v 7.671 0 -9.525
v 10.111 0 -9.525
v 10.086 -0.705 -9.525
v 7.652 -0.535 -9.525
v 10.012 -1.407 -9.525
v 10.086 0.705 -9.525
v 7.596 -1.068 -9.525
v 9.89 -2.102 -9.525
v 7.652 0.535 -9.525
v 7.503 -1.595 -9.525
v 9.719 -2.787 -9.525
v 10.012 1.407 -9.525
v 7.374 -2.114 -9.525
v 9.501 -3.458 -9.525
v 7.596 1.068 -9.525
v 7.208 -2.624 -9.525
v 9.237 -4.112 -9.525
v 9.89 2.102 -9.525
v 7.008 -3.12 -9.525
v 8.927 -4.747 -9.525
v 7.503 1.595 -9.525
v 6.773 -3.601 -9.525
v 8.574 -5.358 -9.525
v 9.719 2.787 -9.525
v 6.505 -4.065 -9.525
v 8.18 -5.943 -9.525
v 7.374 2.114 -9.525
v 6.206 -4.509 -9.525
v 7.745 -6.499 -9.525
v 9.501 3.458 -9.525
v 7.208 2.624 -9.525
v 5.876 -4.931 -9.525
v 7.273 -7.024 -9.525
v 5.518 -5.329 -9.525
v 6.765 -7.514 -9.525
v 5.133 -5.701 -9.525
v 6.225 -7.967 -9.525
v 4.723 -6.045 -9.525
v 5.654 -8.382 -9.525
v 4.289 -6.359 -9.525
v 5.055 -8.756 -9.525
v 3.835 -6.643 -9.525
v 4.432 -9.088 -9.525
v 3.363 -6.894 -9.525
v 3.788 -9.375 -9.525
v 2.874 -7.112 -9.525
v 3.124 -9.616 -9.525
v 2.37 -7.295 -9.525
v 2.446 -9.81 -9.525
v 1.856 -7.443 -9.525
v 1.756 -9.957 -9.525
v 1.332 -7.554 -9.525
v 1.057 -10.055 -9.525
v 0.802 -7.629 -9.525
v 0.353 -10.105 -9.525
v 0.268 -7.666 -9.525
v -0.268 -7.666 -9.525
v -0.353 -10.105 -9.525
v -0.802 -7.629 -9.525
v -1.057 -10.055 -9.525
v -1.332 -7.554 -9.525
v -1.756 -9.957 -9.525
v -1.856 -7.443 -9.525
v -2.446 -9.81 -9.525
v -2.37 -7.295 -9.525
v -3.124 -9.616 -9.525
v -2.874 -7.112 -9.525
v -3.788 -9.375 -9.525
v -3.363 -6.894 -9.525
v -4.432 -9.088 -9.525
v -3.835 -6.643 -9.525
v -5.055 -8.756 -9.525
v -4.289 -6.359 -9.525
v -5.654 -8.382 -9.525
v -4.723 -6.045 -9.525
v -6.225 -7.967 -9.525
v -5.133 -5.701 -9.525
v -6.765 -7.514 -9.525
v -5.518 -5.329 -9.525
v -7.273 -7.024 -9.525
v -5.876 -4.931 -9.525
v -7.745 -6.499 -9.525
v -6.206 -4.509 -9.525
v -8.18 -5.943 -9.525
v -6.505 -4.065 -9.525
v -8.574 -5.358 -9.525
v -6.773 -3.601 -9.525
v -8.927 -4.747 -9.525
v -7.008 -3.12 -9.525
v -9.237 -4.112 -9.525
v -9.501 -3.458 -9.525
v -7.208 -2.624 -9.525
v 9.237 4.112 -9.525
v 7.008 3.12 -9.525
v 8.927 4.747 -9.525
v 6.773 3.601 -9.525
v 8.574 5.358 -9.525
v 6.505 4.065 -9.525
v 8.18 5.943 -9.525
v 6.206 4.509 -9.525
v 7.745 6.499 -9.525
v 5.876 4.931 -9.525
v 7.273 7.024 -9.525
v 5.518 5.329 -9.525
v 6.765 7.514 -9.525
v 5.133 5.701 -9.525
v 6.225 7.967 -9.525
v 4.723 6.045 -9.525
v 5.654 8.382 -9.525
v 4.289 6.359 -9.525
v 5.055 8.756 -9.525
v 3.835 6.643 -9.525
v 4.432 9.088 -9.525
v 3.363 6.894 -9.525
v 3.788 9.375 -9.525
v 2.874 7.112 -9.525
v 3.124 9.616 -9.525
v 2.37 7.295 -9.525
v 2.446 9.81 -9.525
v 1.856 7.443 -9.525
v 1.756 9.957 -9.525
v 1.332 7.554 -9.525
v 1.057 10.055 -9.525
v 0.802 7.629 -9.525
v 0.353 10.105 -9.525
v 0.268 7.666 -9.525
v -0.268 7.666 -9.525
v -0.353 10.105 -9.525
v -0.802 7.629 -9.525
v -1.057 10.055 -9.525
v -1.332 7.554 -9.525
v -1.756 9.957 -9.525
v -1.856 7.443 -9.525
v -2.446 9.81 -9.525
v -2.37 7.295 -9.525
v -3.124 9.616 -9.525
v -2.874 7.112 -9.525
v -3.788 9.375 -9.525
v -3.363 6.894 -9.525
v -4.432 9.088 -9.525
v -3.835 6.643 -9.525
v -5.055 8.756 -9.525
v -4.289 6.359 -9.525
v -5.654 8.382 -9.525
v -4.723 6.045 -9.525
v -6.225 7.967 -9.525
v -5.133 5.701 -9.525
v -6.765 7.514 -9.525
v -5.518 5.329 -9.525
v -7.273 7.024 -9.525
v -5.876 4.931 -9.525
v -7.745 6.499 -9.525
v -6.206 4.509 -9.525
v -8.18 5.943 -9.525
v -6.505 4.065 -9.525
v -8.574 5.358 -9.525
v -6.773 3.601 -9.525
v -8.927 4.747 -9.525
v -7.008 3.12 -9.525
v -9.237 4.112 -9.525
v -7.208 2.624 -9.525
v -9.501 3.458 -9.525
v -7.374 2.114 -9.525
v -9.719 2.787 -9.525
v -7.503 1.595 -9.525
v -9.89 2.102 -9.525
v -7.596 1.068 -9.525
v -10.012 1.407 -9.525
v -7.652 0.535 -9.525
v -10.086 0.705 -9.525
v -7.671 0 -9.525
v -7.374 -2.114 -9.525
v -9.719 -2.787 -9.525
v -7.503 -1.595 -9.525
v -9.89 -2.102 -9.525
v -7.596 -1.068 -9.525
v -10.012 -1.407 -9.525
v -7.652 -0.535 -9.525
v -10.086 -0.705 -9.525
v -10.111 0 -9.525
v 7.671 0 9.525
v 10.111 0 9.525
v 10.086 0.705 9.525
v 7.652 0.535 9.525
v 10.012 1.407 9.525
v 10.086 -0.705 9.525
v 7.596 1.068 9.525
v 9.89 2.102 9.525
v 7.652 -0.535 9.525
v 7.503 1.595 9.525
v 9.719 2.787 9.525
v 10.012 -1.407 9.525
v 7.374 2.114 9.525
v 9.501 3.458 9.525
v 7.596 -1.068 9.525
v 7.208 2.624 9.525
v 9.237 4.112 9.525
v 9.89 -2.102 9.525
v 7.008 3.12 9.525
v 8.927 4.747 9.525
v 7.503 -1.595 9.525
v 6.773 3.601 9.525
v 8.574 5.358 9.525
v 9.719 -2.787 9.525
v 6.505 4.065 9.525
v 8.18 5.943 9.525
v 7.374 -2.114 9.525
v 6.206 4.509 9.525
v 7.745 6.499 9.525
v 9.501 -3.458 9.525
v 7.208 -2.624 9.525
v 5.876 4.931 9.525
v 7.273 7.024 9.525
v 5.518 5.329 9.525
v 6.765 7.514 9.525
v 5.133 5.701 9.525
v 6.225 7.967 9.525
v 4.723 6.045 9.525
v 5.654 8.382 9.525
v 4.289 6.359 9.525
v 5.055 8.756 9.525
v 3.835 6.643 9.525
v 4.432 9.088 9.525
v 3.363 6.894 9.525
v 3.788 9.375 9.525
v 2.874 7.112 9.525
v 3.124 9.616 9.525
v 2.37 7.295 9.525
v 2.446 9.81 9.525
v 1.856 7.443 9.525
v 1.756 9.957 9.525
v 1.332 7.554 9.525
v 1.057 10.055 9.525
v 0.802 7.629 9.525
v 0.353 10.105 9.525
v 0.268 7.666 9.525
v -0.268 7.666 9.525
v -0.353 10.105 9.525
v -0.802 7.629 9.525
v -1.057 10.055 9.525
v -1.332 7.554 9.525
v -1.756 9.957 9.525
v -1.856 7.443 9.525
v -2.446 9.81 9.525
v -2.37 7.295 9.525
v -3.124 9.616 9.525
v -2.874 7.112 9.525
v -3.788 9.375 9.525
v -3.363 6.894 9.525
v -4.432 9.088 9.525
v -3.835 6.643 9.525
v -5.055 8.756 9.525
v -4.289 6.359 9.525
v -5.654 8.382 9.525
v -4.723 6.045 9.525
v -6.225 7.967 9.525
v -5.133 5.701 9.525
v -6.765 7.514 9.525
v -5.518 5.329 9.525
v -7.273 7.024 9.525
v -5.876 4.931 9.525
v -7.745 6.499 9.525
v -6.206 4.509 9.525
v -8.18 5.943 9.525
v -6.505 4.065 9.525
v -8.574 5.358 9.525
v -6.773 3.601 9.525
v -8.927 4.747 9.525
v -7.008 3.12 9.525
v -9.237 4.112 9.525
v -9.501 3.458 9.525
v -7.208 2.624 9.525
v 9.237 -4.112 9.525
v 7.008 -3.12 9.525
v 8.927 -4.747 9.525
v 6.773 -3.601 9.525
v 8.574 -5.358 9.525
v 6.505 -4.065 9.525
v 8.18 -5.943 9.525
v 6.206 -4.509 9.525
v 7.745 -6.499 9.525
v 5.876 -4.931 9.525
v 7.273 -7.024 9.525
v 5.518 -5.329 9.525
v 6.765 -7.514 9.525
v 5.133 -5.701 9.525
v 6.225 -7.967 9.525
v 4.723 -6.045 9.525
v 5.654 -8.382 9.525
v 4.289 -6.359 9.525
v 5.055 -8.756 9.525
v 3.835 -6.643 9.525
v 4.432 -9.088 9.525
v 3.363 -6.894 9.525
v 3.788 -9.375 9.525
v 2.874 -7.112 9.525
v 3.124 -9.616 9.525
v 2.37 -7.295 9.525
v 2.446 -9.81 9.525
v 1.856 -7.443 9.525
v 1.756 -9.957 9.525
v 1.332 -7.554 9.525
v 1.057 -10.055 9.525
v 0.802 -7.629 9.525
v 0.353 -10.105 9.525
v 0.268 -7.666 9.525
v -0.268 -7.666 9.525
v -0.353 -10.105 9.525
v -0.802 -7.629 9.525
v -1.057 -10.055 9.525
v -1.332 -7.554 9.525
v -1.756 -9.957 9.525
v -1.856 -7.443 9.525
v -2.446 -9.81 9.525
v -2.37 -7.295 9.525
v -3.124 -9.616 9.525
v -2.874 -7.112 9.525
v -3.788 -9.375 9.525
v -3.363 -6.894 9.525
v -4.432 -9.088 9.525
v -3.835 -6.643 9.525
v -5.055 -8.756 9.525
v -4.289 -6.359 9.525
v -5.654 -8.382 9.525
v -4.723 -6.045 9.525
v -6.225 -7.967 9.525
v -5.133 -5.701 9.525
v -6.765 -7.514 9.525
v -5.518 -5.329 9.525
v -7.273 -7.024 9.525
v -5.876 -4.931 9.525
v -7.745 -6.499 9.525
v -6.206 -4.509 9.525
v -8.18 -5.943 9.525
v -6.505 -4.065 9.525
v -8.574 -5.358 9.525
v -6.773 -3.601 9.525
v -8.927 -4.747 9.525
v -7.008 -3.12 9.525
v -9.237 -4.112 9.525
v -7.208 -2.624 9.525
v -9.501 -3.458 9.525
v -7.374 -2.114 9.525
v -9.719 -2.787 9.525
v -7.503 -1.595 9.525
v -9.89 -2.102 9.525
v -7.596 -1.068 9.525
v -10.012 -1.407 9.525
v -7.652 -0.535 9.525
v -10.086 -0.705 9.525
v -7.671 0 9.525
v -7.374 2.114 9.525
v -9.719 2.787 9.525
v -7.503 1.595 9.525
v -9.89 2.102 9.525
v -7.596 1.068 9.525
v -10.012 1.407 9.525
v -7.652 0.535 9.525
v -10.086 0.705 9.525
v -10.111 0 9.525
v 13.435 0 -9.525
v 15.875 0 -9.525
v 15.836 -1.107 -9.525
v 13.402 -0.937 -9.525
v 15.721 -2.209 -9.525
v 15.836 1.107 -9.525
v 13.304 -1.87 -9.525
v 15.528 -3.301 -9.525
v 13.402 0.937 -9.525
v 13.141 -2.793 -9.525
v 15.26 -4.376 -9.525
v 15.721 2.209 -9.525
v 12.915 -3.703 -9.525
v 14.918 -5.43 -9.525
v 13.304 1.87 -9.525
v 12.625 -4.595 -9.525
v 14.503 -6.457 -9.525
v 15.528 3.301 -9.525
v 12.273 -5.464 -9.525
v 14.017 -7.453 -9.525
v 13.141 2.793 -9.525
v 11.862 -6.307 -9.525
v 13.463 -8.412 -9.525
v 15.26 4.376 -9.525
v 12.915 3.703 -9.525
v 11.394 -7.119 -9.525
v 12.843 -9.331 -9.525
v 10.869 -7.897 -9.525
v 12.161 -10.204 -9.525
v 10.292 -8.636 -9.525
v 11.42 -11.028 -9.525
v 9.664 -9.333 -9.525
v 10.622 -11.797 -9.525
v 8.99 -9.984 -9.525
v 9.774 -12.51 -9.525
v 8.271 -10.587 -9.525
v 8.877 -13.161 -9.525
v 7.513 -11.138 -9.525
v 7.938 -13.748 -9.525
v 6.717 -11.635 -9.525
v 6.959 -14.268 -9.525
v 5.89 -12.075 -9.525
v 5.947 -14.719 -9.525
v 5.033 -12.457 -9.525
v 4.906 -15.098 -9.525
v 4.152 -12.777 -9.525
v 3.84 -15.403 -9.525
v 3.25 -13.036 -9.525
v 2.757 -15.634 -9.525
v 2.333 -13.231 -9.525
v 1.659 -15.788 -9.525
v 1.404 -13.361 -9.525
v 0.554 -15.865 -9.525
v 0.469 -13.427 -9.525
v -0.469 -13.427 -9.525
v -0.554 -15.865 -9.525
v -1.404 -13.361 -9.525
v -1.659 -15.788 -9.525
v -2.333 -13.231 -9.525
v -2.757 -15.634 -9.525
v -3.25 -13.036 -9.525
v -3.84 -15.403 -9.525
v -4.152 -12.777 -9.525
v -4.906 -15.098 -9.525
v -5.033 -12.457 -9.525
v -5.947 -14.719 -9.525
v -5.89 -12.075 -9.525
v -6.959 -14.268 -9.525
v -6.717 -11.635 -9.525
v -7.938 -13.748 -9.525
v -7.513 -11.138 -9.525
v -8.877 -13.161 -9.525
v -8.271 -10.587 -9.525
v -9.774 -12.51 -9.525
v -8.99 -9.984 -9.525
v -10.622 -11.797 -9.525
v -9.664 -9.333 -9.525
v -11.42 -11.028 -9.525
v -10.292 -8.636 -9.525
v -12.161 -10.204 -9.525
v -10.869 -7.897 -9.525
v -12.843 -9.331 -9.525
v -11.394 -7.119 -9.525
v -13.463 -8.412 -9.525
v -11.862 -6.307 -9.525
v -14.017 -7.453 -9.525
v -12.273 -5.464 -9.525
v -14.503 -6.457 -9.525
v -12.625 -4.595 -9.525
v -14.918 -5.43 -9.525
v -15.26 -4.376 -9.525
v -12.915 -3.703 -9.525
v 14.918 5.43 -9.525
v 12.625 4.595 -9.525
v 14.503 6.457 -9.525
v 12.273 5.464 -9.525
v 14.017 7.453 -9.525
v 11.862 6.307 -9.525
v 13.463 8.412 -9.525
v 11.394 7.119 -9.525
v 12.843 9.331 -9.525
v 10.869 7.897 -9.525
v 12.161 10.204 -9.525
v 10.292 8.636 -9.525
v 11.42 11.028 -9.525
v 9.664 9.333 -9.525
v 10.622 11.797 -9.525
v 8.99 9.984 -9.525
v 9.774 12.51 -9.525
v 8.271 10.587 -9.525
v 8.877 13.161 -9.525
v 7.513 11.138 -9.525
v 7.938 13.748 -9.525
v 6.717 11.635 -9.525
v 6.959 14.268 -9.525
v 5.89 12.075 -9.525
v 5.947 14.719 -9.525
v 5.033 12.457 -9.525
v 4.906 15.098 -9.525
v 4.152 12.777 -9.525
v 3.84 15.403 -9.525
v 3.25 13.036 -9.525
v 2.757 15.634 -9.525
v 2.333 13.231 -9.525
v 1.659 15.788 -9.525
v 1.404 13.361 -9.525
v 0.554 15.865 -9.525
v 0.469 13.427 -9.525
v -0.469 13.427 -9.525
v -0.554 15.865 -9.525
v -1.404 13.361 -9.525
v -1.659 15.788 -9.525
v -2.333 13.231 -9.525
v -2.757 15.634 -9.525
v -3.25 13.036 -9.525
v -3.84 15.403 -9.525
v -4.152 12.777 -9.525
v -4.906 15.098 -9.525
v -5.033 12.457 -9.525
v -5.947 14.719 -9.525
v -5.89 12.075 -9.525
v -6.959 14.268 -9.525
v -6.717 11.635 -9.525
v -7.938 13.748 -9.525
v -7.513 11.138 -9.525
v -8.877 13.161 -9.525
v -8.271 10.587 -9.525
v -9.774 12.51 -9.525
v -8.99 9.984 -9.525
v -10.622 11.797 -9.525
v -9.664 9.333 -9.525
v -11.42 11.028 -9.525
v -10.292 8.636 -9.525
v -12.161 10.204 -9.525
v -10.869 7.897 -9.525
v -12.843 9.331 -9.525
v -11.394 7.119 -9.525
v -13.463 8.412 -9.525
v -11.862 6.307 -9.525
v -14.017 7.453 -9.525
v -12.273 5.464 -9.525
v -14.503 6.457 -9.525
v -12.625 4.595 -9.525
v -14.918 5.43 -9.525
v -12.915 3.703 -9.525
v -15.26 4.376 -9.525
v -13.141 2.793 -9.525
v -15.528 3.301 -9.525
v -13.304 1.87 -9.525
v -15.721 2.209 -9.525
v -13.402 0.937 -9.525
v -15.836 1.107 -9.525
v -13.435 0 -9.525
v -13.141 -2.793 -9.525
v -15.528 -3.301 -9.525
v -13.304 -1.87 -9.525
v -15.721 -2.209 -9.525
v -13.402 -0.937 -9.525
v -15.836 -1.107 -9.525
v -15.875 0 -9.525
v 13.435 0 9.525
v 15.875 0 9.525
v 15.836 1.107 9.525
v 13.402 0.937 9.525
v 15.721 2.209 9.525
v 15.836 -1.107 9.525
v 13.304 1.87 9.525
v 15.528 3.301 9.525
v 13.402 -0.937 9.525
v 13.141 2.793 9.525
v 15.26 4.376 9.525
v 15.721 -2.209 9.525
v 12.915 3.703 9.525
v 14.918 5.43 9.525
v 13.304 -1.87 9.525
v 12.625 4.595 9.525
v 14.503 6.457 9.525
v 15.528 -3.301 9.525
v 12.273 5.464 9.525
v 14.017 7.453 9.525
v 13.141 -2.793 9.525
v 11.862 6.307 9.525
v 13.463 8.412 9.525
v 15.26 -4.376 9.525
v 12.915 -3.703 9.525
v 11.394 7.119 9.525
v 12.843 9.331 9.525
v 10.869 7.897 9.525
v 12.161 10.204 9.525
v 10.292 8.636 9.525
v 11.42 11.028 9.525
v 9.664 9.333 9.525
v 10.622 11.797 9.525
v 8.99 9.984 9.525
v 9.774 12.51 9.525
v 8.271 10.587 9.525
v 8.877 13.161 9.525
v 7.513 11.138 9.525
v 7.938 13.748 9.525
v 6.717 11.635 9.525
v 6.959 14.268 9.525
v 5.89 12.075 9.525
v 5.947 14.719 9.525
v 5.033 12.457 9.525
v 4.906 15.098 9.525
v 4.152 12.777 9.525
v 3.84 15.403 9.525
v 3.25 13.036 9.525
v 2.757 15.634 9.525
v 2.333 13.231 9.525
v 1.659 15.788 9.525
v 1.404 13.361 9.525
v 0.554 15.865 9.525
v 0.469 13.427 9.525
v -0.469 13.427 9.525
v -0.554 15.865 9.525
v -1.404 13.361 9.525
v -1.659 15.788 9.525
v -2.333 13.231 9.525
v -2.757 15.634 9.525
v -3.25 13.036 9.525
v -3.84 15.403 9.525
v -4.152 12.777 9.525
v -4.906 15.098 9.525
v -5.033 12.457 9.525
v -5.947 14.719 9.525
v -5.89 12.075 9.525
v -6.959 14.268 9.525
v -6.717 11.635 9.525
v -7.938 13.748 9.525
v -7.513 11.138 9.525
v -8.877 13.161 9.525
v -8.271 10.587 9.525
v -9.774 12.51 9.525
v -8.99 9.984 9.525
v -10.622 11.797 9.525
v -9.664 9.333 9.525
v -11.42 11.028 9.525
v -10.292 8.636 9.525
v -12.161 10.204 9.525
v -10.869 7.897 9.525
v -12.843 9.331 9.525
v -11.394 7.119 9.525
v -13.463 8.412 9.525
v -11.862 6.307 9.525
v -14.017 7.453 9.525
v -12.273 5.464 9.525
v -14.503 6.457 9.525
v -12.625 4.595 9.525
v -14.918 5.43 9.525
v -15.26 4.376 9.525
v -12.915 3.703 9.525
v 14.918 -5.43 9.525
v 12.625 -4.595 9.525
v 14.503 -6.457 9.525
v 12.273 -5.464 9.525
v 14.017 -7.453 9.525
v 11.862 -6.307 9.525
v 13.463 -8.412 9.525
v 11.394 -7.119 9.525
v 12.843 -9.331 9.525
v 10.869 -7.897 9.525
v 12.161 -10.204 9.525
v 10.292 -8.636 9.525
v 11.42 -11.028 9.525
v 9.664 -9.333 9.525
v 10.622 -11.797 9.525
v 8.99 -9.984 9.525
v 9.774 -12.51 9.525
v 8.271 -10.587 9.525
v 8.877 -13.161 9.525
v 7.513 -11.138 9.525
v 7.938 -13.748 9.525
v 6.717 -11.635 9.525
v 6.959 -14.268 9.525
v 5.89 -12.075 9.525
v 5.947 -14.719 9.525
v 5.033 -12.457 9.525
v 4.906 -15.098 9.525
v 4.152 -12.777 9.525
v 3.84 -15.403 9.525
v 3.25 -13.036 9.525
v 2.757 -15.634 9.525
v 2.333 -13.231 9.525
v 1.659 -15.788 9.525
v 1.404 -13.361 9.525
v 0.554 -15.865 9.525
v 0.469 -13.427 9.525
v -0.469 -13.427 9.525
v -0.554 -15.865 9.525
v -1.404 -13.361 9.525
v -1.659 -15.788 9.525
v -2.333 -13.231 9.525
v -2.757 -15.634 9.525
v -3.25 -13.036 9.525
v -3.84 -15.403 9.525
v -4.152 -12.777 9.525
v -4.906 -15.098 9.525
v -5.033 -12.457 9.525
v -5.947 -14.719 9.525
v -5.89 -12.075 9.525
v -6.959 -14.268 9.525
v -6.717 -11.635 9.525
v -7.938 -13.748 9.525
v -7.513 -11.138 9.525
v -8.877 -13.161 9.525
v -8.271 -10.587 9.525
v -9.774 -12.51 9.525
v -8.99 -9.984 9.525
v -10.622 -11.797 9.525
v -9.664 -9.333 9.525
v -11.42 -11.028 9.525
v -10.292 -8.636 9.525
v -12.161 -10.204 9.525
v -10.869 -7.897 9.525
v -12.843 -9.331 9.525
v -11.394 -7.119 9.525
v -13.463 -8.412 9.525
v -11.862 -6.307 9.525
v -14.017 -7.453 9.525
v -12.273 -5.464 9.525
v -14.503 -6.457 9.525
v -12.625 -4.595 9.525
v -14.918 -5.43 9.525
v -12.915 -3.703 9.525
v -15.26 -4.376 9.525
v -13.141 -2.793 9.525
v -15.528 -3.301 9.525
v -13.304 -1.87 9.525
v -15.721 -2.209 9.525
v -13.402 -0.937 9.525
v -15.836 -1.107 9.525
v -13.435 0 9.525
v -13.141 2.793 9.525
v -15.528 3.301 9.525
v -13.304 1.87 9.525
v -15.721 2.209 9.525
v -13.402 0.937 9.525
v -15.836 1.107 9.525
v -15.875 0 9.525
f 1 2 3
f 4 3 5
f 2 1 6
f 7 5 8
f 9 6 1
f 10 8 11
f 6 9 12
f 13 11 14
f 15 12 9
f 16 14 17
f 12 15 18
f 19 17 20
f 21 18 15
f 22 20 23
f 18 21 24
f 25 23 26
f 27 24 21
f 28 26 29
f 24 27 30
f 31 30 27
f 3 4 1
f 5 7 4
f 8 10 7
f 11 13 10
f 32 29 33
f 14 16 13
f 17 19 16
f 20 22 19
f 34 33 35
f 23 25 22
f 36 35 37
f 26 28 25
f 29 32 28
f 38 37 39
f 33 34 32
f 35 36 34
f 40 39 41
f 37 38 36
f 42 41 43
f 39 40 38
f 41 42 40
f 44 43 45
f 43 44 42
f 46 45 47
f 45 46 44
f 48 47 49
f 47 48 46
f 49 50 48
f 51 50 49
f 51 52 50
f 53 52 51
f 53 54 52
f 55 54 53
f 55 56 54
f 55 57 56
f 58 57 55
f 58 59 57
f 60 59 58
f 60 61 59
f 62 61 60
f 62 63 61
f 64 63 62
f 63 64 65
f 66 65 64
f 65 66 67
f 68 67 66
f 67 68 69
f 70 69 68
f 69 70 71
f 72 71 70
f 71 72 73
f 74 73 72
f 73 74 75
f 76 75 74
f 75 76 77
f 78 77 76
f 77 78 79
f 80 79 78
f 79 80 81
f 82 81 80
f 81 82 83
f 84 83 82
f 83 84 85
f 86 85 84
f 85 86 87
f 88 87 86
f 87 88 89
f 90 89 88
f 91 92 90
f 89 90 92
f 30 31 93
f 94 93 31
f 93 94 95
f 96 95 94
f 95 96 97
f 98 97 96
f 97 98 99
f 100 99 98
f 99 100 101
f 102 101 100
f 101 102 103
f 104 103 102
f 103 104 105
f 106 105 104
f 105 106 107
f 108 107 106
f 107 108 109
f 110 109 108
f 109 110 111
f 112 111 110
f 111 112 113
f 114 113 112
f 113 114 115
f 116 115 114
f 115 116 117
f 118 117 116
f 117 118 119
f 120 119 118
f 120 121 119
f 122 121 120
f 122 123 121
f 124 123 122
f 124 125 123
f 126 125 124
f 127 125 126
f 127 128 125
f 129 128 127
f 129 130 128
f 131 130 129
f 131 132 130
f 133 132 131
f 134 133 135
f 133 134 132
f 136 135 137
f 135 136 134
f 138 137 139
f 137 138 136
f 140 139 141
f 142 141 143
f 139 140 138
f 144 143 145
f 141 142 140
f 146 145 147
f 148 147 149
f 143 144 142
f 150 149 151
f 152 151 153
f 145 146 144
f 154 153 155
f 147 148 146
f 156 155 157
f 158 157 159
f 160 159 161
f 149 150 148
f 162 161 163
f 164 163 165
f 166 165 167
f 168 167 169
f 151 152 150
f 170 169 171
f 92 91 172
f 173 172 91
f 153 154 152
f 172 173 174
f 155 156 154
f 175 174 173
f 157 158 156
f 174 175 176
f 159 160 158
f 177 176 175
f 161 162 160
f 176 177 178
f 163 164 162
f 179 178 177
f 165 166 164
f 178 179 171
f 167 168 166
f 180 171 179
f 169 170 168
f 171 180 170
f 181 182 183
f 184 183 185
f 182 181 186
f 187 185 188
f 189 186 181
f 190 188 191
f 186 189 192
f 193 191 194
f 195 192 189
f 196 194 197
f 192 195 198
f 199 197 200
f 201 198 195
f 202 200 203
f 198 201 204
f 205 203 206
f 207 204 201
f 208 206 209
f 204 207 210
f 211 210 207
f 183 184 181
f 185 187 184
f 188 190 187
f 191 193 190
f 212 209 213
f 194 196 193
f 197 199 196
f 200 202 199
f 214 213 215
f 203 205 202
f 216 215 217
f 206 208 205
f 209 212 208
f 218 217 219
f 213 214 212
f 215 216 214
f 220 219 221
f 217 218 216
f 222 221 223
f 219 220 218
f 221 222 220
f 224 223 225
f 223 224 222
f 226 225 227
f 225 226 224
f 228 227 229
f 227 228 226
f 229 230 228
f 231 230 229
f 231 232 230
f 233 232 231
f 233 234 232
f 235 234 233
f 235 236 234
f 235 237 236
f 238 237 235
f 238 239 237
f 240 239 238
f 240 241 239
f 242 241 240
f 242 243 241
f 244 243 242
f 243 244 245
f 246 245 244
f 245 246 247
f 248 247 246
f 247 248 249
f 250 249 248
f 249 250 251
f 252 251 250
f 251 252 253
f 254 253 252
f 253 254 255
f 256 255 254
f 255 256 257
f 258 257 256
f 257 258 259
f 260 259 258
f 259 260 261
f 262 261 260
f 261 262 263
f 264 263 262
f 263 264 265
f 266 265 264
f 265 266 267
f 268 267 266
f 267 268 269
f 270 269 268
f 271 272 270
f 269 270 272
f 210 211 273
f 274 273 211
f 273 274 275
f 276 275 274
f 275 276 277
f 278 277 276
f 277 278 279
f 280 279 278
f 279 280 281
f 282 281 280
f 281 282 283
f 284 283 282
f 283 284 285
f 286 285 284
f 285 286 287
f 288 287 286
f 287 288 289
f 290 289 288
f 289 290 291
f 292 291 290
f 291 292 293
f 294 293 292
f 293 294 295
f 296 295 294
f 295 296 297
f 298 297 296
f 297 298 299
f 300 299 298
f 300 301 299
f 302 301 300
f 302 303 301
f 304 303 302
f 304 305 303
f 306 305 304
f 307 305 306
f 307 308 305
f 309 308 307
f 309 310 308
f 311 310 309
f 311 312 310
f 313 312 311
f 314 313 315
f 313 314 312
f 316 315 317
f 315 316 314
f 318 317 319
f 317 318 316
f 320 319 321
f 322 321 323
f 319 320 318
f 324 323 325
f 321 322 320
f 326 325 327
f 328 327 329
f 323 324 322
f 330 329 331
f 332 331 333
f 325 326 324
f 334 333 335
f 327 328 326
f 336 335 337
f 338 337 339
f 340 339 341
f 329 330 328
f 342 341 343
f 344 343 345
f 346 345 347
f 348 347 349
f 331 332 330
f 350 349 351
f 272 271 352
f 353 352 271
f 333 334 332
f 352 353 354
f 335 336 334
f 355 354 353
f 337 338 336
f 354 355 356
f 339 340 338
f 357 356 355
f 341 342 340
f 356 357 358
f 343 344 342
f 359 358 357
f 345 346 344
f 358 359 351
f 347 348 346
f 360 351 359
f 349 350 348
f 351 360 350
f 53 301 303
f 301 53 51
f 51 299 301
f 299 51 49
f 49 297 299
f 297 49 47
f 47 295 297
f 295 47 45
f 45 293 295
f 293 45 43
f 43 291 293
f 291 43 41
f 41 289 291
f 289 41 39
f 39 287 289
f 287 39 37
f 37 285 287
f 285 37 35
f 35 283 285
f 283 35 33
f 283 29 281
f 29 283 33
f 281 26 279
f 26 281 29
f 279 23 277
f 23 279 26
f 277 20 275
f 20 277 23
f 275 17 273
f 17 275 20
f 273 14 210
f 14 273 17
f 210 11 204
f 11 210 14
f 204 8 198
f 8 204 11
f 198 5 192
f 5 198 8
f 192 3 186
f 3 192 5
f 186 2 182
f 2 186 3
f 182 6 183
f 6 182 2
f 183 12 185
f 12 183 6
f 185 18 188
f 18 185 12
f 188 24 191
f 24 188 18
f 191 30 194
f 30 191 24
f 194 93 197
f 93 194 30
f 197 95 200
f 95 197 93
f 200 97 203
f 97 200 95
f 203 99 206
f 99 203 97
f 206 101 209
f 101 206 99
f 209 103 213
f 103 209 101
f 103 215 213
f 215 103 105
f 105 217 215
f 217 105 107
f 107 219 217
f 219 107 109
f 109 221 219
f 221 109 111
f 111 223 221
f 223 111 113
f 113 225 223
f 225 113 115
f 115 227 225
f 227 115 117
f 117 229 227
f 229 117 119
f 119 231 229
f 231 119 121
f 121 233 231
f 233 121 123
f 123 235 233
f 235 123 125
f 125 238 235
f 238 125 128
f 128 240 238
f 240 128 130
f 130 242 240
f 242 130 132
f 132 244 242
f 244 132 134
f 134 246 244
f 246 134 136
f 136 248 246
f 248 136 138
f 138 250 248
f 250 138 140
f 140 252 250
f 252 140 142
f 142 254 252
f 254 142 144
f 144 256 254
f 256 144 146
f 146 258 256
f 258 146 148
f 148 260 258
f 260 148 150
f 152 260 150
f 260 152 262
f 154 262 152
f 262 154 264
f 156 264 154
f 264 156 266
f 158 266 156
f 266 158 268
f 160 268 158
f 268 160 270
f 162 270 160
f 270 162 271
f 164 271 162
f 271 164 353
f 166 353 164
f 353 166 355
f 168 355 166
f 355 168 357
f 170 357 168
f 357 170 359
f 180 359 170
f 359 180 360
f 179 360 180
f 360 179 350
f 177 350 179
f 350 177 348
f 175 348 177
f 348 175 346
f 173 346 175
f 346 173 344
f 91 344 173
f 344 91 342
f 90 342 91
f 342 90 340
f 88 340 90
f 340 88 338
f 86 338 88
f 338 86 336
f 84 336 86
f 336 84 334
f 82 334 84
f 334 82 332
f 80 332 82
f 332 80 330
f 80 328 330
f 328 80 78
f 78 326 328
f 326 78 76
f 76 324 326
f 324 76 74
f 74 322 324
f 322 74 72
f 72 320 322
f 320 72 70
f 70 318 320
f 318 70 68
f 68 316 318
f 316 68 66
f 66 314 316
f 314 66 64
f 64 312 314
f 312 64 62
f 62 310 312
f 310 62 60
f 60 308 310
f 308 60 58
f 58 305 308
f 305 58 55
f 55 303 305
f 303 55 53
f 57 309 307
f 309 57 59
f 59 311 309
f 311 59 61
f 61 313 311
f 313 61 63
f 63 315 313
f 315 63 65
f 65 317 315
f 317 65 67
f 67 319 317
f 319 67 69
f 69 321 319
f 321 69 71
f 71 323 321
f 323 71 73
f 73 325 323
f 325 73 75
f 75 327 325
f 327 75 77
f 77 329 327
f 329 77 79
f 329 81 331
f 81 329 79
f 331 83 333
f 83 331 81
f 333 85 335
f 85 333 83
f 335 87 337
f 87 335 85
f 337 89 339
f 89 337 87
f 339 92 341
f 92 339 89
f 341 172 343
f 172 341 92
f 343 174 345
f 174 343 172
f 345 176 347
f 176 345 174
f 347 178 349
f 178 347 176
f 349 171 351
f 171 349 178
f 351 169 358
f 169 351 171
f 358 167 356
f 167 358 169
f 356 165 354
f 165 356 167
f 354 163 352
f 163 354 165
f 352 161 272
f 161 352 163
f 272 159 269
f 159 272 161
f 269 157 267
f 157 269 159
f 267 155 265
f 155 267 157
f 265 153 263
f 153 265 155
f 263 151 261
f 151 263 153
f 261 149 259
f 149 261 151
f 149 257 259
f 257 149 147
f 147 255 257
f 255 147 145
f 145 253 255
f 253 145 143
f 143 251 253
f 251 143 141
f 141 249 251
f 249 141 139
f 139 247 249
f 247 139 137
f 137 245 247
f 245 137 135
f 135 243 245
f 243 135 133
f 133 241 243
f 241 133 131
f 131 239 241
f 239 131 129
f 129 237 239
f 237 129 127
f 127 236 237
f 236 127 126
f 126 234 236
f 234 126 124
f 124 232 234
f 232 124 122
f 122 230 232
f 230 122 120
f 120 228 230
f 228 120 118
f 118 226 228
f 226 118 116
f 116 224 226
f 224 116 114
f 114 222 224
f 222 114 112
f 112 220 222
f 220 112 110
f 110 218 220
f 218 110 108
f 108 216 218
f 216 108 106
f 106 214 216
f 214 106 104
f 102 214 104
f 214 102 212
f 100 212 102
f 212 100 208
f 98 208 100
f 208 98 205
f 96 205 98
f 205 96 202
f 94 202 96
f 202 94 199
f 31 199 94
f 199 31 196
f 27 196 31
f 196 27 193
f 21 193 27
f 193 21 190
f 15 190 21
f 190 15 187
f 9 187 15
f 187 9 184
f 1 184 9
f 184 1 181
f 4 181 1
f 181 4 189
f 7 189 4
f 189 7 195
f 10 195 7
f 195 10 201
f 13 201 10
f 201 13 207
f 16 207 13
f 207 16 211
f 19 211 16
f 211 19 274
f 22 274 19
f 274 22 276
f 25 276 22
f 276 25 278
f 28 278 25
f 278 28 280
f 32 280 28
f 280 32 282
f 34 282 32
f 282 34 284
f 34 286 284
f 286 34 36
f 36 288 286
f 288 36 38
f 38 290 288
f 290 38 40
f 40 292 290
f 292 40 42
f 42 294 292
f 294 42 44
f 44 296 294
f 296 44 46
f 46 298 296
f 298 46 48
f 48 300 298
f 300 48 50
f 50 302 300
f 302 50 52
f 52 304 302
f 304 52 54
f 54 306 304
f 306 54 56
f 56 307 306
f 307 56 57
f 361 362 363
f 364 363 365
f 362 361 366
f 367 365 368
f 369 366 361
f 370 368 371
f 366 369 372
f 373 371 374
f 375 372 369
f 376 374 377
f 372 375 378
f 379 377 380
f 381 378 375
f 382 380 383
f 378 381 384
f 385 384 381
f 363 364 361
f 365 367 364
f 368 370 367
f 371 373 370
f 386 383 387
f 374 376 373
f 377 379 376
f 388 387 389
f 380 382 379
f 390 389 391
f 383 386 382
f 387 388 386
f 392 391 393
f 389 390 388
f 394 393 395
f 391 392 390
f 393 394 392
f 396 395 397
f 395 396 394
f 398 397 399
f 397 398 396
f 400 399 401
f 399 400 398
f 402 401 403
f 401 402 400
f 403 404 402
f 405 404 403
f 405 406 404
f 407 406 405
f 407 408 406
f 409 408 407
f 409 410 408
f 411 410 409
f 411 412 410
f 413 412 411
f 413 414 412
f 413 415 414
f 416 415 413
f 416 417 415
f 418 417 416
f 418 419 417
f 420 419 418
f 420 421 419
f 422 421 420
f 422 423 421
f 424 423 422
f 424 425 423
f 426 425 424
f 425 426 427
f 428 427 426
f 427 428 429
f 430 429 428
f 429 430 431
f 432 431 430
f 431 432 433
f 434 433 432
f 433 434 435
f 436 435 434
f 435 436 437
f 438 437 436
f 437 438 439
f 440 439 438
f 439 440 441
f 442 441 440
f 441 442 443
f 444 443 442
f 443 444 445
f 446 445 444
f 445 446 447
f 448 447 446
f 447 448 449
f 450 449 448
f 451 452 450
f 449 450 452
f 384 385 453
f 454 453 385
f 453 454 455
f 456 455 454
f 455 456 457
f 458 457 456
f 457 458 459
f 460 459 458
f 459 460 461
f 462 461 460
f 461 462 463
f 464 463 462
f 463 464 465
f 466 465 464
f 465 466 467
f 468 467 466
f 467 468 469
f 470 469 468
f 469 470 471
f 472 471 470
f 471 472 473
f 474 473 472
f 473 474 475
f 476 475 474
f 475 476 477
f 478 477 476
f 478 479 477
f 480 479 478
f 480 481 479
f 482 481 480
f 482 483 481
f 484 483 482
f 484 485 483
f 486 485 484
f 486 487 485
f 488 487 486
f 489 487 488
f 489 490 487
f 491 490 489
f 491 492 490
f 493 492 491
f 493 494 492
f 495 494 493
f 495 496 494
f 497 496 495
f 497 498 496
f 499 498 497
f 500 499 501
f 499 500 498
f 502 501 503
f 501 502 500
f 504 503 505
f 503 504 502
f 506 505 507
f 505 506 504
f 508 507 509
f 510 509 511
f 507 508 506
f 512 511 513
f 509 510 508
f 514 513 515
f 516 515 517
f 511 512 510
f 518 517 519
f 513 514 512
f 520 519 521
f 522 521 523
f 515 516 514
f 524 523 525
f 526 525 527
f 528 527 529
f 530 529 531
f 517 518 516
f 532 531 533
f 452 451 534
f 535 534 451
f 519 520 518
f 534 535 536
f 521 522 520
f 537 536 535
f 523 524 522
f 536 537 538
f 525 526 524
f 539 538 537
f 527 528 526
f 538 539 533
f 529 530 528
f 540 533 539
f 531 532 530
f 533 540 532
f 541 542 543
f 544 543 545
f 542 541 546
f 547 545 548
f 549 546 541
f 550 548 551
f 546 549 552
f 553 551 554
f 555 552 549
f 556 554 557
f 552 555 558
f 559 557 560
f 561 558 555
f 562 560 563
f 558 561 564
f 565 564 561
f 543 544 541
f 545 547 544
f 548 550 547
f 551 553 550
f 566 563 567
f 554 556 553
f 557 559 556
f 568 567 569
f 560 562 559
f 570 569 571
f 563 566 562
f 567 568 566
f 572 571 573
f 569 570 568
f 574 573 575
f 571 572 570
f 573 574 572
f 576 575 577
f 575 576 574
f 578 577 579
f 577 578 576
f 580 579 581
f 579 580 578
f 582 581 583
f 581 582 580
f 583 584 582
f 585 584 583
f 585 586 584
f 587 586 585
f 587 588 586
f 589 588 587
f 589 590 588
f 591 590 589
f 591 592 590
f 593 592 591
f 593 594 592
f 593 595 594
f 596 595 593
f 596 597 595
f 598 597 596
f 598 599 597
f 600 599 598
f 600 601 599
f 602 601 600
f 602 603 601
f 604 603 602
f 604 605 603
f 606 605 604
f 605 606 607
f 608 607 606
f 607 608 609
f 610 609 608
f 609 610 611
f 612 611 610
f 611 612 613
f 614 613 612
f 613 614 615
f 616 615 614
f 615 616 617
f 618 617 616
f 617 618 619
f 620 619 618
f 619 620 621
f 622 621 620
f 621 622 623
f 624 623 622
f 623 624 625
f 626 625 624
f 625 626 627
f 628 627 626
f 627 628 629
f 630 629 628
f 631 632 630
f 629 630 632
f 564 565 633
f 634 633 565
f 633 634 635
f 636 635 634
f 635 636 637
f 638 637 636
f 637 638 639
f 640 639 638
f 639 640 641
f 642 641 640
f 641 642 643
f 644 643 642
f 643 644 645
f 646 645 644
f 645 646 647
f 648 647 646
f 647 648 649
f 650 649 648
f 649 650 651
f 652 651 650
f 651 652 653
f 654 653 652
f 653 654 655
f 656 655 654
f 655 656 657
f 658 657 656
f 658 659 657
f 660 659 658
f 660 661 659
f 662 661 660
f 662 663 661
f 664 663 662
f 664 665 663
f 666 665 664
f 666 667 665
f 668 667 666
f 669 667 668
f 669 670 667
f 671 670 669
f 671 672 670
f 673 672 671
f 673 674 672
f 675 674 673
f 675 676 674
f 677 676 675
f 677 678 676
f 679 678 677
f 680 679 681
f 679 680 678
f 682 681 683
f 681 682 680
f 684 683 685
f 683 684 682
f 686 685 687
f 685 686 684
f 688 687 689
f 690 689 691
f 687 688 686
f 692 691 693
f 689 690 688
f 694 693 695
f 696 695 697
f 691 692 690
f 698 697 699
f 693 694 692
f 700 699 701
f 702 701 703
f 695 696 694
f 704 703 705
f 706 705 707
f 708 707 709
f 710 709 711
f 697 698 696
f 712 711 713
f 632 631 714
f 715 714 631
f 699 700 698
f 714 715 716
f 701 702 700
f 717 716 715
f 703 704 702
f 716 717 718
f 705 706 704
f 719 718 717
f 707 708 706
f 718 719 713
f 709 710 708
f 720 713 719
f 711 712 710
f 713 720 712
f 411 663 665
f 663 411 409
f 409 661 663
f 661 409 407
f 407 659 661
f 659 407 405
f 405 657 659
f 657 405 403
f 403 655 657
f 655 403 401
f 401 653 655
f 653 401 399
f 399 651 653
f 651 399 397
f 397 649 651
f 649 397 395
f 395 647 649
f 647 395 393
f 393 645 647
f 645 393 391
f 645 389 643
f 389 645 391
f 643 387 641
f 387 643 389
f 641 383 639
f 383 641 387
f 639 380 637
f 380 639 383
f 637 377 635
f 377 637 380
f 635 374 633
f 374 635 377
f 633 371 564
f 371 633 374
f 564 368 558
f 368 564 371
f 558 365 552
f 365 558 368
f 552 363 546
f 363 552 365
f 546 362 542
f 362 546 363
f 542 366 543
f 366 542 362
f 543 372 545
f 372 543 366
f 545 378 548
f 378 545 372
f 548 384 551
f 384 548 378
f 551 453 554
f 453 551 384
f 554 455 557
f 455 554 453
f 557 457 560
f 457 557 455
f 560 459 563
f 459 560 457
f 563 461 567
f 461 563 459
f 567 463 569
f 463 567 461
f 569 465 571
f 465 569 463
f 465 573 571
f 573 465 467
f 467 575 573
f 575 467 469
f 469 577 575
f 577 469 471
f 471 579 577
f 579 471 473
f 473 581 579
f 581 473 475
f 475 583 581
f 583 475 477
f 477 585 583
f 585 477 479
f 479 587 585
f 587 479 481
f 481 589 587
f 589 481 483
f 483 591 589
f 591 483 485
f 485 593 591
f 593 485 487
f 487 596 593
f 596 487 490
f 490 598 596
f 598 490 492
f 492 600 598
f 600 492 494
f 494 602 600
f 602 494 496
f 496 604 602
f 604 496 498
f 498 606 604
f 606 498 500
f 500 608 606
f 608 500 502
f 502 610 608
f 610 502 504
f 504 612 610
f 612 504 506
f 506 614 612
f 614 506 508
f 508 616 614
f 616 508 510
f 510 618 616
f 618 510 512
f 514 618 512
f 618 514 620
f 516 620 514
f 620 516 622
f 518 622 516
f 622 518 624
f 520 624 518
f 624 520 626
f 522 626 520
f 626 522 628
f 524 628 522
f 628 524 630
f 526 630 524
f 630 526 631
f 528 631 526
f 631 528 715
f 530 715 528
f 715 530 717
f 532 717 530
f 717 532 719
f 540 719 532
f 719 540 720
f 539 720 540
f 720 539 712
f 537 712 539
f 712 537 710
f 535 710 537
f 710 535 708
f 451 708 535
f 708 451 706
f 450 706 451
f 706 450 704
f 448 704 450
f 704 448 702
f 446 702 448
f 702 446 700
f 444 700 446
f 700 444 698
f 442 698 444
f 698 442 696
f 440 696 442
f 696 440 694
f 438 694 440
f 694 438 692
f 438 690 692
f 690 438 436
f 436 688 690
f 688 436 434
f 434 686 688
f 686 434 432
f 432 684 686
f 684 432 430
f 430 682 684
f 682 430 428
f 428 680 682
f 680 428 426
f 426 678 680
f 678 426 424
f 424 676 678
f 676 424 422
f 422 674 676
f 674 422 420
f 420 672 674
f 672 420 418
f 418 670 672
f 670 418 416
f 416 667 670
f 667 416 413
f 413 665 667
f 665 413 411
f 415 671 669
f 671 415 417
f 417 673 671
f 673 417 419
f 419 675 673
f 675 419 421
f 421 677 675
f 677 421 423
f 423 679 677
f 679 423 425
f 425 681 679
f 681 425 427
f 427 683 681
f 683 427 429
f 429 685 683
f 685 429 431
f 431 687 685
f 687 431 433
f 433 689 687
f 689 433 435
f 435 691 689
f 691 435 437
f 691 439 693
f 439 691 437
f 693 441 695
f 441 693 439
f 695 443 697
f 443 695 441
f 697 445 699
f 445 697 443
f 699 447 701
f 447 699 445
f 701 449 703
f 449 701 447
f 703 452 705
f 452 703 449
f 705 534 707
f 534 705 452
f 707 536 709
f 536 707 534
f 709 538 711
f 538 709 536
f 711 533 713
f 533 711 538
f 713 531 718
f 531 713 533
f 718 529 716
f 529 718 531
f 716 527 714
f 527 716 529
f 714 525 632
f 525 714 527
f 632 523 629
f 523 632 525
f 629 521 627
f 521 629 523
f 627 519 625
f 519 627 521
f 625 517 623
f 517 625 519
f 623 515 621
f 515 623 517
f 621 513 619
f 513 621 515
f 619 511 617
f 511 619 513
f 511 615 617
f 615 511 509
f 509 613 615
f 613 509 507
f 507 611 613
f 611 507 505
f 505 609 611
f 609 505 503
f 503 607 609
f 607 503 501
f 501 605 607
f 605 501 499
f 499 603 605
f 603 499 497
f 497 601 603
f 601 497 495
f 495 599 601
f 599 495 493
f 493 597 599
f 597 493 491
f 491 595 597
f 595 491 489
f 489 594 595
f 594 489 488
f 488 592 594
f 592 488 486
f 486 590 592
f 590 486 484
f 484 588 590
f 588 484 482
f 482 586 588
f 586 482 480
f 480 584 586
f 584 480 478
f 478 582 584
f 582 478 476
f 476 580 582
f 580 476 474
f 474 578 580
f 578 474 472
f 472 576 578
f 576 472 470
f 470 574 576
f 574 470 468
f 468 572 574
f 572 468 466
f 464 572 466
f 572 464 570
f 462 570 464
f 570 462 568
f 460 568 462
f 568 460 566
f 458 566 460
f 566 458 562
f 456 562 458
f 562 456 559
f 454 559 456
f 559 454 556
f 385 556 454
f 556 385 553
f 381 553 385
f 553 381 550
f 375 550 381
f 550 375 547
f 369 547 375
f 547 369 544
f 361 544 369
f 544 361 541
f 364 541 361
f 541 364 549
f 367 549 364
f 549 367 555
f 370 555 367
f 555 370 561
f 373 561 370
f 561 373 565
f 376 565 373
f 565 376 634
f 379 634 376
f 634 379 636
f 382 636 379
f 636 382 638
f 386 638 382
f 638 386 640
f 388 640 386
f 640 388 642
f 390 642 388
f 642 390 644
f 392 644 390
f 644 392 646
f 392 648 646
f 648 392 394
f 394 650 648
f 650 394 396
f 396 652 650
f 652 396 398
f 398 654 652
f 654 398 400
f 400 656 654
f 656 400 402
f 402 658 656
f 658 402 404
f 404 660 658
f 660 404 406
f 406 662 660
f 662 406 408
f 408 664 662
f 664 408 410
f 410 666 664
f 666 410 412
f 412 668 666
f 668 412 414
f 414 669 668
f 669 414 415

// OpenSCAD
// file: circles.scad
$fn=90;

module ring(outer_radius, inner_radius, center=true) {
    difference() {
        circle(r=outer_radius, center=center);
        circle(r=inner_radius, center=center);
    }
}

module torus(large_radius, small_radius, center=true) {
    rotate_extrude()
    translate([large_radius, 0, 0])
    circle(r=small_radius, center=center);
}
// main file
use <circles.scad>

INCH_TO_MM = 25.4;
TOL = 0.1;

3_4_OD = 1.05 * INCH_TO_MM;
3_4_ID = 0.804* INCH_TO_MM;

module 3_4_pipe(length, center=true) {
    linear_extrude(INCH_TO_MM * length, center=center)
    ring(outer_radius=3_4_OD/2, inner_radius=3_4_ID/2);
}
*3_4_pipe(length=0.75);

module 3_4_connector_inner(length, thickness, center=true) {
    linear_extrude(INCH_TO_MM * length, center=center)
    ring(outer_radius=3_4_ID/2 - TOL, inner_radius=3_4_ID/2 - INCH_TO_MM * thickness);
}
3_4_connector_inner(length=0.75, thickness = 0.1);

module 3_4_connector_outer(length, thickness, center=true) {
    linear_extrude(INCH_TO_MM * length, center=center)
    ring(outer_radius=3_4_OD/2 + INCH_TO_MM * thickness, inner_radius=3_4_OD/2 + TOL);
}
3_4_connector_outer(length=0.75, thickness = 0.1);
